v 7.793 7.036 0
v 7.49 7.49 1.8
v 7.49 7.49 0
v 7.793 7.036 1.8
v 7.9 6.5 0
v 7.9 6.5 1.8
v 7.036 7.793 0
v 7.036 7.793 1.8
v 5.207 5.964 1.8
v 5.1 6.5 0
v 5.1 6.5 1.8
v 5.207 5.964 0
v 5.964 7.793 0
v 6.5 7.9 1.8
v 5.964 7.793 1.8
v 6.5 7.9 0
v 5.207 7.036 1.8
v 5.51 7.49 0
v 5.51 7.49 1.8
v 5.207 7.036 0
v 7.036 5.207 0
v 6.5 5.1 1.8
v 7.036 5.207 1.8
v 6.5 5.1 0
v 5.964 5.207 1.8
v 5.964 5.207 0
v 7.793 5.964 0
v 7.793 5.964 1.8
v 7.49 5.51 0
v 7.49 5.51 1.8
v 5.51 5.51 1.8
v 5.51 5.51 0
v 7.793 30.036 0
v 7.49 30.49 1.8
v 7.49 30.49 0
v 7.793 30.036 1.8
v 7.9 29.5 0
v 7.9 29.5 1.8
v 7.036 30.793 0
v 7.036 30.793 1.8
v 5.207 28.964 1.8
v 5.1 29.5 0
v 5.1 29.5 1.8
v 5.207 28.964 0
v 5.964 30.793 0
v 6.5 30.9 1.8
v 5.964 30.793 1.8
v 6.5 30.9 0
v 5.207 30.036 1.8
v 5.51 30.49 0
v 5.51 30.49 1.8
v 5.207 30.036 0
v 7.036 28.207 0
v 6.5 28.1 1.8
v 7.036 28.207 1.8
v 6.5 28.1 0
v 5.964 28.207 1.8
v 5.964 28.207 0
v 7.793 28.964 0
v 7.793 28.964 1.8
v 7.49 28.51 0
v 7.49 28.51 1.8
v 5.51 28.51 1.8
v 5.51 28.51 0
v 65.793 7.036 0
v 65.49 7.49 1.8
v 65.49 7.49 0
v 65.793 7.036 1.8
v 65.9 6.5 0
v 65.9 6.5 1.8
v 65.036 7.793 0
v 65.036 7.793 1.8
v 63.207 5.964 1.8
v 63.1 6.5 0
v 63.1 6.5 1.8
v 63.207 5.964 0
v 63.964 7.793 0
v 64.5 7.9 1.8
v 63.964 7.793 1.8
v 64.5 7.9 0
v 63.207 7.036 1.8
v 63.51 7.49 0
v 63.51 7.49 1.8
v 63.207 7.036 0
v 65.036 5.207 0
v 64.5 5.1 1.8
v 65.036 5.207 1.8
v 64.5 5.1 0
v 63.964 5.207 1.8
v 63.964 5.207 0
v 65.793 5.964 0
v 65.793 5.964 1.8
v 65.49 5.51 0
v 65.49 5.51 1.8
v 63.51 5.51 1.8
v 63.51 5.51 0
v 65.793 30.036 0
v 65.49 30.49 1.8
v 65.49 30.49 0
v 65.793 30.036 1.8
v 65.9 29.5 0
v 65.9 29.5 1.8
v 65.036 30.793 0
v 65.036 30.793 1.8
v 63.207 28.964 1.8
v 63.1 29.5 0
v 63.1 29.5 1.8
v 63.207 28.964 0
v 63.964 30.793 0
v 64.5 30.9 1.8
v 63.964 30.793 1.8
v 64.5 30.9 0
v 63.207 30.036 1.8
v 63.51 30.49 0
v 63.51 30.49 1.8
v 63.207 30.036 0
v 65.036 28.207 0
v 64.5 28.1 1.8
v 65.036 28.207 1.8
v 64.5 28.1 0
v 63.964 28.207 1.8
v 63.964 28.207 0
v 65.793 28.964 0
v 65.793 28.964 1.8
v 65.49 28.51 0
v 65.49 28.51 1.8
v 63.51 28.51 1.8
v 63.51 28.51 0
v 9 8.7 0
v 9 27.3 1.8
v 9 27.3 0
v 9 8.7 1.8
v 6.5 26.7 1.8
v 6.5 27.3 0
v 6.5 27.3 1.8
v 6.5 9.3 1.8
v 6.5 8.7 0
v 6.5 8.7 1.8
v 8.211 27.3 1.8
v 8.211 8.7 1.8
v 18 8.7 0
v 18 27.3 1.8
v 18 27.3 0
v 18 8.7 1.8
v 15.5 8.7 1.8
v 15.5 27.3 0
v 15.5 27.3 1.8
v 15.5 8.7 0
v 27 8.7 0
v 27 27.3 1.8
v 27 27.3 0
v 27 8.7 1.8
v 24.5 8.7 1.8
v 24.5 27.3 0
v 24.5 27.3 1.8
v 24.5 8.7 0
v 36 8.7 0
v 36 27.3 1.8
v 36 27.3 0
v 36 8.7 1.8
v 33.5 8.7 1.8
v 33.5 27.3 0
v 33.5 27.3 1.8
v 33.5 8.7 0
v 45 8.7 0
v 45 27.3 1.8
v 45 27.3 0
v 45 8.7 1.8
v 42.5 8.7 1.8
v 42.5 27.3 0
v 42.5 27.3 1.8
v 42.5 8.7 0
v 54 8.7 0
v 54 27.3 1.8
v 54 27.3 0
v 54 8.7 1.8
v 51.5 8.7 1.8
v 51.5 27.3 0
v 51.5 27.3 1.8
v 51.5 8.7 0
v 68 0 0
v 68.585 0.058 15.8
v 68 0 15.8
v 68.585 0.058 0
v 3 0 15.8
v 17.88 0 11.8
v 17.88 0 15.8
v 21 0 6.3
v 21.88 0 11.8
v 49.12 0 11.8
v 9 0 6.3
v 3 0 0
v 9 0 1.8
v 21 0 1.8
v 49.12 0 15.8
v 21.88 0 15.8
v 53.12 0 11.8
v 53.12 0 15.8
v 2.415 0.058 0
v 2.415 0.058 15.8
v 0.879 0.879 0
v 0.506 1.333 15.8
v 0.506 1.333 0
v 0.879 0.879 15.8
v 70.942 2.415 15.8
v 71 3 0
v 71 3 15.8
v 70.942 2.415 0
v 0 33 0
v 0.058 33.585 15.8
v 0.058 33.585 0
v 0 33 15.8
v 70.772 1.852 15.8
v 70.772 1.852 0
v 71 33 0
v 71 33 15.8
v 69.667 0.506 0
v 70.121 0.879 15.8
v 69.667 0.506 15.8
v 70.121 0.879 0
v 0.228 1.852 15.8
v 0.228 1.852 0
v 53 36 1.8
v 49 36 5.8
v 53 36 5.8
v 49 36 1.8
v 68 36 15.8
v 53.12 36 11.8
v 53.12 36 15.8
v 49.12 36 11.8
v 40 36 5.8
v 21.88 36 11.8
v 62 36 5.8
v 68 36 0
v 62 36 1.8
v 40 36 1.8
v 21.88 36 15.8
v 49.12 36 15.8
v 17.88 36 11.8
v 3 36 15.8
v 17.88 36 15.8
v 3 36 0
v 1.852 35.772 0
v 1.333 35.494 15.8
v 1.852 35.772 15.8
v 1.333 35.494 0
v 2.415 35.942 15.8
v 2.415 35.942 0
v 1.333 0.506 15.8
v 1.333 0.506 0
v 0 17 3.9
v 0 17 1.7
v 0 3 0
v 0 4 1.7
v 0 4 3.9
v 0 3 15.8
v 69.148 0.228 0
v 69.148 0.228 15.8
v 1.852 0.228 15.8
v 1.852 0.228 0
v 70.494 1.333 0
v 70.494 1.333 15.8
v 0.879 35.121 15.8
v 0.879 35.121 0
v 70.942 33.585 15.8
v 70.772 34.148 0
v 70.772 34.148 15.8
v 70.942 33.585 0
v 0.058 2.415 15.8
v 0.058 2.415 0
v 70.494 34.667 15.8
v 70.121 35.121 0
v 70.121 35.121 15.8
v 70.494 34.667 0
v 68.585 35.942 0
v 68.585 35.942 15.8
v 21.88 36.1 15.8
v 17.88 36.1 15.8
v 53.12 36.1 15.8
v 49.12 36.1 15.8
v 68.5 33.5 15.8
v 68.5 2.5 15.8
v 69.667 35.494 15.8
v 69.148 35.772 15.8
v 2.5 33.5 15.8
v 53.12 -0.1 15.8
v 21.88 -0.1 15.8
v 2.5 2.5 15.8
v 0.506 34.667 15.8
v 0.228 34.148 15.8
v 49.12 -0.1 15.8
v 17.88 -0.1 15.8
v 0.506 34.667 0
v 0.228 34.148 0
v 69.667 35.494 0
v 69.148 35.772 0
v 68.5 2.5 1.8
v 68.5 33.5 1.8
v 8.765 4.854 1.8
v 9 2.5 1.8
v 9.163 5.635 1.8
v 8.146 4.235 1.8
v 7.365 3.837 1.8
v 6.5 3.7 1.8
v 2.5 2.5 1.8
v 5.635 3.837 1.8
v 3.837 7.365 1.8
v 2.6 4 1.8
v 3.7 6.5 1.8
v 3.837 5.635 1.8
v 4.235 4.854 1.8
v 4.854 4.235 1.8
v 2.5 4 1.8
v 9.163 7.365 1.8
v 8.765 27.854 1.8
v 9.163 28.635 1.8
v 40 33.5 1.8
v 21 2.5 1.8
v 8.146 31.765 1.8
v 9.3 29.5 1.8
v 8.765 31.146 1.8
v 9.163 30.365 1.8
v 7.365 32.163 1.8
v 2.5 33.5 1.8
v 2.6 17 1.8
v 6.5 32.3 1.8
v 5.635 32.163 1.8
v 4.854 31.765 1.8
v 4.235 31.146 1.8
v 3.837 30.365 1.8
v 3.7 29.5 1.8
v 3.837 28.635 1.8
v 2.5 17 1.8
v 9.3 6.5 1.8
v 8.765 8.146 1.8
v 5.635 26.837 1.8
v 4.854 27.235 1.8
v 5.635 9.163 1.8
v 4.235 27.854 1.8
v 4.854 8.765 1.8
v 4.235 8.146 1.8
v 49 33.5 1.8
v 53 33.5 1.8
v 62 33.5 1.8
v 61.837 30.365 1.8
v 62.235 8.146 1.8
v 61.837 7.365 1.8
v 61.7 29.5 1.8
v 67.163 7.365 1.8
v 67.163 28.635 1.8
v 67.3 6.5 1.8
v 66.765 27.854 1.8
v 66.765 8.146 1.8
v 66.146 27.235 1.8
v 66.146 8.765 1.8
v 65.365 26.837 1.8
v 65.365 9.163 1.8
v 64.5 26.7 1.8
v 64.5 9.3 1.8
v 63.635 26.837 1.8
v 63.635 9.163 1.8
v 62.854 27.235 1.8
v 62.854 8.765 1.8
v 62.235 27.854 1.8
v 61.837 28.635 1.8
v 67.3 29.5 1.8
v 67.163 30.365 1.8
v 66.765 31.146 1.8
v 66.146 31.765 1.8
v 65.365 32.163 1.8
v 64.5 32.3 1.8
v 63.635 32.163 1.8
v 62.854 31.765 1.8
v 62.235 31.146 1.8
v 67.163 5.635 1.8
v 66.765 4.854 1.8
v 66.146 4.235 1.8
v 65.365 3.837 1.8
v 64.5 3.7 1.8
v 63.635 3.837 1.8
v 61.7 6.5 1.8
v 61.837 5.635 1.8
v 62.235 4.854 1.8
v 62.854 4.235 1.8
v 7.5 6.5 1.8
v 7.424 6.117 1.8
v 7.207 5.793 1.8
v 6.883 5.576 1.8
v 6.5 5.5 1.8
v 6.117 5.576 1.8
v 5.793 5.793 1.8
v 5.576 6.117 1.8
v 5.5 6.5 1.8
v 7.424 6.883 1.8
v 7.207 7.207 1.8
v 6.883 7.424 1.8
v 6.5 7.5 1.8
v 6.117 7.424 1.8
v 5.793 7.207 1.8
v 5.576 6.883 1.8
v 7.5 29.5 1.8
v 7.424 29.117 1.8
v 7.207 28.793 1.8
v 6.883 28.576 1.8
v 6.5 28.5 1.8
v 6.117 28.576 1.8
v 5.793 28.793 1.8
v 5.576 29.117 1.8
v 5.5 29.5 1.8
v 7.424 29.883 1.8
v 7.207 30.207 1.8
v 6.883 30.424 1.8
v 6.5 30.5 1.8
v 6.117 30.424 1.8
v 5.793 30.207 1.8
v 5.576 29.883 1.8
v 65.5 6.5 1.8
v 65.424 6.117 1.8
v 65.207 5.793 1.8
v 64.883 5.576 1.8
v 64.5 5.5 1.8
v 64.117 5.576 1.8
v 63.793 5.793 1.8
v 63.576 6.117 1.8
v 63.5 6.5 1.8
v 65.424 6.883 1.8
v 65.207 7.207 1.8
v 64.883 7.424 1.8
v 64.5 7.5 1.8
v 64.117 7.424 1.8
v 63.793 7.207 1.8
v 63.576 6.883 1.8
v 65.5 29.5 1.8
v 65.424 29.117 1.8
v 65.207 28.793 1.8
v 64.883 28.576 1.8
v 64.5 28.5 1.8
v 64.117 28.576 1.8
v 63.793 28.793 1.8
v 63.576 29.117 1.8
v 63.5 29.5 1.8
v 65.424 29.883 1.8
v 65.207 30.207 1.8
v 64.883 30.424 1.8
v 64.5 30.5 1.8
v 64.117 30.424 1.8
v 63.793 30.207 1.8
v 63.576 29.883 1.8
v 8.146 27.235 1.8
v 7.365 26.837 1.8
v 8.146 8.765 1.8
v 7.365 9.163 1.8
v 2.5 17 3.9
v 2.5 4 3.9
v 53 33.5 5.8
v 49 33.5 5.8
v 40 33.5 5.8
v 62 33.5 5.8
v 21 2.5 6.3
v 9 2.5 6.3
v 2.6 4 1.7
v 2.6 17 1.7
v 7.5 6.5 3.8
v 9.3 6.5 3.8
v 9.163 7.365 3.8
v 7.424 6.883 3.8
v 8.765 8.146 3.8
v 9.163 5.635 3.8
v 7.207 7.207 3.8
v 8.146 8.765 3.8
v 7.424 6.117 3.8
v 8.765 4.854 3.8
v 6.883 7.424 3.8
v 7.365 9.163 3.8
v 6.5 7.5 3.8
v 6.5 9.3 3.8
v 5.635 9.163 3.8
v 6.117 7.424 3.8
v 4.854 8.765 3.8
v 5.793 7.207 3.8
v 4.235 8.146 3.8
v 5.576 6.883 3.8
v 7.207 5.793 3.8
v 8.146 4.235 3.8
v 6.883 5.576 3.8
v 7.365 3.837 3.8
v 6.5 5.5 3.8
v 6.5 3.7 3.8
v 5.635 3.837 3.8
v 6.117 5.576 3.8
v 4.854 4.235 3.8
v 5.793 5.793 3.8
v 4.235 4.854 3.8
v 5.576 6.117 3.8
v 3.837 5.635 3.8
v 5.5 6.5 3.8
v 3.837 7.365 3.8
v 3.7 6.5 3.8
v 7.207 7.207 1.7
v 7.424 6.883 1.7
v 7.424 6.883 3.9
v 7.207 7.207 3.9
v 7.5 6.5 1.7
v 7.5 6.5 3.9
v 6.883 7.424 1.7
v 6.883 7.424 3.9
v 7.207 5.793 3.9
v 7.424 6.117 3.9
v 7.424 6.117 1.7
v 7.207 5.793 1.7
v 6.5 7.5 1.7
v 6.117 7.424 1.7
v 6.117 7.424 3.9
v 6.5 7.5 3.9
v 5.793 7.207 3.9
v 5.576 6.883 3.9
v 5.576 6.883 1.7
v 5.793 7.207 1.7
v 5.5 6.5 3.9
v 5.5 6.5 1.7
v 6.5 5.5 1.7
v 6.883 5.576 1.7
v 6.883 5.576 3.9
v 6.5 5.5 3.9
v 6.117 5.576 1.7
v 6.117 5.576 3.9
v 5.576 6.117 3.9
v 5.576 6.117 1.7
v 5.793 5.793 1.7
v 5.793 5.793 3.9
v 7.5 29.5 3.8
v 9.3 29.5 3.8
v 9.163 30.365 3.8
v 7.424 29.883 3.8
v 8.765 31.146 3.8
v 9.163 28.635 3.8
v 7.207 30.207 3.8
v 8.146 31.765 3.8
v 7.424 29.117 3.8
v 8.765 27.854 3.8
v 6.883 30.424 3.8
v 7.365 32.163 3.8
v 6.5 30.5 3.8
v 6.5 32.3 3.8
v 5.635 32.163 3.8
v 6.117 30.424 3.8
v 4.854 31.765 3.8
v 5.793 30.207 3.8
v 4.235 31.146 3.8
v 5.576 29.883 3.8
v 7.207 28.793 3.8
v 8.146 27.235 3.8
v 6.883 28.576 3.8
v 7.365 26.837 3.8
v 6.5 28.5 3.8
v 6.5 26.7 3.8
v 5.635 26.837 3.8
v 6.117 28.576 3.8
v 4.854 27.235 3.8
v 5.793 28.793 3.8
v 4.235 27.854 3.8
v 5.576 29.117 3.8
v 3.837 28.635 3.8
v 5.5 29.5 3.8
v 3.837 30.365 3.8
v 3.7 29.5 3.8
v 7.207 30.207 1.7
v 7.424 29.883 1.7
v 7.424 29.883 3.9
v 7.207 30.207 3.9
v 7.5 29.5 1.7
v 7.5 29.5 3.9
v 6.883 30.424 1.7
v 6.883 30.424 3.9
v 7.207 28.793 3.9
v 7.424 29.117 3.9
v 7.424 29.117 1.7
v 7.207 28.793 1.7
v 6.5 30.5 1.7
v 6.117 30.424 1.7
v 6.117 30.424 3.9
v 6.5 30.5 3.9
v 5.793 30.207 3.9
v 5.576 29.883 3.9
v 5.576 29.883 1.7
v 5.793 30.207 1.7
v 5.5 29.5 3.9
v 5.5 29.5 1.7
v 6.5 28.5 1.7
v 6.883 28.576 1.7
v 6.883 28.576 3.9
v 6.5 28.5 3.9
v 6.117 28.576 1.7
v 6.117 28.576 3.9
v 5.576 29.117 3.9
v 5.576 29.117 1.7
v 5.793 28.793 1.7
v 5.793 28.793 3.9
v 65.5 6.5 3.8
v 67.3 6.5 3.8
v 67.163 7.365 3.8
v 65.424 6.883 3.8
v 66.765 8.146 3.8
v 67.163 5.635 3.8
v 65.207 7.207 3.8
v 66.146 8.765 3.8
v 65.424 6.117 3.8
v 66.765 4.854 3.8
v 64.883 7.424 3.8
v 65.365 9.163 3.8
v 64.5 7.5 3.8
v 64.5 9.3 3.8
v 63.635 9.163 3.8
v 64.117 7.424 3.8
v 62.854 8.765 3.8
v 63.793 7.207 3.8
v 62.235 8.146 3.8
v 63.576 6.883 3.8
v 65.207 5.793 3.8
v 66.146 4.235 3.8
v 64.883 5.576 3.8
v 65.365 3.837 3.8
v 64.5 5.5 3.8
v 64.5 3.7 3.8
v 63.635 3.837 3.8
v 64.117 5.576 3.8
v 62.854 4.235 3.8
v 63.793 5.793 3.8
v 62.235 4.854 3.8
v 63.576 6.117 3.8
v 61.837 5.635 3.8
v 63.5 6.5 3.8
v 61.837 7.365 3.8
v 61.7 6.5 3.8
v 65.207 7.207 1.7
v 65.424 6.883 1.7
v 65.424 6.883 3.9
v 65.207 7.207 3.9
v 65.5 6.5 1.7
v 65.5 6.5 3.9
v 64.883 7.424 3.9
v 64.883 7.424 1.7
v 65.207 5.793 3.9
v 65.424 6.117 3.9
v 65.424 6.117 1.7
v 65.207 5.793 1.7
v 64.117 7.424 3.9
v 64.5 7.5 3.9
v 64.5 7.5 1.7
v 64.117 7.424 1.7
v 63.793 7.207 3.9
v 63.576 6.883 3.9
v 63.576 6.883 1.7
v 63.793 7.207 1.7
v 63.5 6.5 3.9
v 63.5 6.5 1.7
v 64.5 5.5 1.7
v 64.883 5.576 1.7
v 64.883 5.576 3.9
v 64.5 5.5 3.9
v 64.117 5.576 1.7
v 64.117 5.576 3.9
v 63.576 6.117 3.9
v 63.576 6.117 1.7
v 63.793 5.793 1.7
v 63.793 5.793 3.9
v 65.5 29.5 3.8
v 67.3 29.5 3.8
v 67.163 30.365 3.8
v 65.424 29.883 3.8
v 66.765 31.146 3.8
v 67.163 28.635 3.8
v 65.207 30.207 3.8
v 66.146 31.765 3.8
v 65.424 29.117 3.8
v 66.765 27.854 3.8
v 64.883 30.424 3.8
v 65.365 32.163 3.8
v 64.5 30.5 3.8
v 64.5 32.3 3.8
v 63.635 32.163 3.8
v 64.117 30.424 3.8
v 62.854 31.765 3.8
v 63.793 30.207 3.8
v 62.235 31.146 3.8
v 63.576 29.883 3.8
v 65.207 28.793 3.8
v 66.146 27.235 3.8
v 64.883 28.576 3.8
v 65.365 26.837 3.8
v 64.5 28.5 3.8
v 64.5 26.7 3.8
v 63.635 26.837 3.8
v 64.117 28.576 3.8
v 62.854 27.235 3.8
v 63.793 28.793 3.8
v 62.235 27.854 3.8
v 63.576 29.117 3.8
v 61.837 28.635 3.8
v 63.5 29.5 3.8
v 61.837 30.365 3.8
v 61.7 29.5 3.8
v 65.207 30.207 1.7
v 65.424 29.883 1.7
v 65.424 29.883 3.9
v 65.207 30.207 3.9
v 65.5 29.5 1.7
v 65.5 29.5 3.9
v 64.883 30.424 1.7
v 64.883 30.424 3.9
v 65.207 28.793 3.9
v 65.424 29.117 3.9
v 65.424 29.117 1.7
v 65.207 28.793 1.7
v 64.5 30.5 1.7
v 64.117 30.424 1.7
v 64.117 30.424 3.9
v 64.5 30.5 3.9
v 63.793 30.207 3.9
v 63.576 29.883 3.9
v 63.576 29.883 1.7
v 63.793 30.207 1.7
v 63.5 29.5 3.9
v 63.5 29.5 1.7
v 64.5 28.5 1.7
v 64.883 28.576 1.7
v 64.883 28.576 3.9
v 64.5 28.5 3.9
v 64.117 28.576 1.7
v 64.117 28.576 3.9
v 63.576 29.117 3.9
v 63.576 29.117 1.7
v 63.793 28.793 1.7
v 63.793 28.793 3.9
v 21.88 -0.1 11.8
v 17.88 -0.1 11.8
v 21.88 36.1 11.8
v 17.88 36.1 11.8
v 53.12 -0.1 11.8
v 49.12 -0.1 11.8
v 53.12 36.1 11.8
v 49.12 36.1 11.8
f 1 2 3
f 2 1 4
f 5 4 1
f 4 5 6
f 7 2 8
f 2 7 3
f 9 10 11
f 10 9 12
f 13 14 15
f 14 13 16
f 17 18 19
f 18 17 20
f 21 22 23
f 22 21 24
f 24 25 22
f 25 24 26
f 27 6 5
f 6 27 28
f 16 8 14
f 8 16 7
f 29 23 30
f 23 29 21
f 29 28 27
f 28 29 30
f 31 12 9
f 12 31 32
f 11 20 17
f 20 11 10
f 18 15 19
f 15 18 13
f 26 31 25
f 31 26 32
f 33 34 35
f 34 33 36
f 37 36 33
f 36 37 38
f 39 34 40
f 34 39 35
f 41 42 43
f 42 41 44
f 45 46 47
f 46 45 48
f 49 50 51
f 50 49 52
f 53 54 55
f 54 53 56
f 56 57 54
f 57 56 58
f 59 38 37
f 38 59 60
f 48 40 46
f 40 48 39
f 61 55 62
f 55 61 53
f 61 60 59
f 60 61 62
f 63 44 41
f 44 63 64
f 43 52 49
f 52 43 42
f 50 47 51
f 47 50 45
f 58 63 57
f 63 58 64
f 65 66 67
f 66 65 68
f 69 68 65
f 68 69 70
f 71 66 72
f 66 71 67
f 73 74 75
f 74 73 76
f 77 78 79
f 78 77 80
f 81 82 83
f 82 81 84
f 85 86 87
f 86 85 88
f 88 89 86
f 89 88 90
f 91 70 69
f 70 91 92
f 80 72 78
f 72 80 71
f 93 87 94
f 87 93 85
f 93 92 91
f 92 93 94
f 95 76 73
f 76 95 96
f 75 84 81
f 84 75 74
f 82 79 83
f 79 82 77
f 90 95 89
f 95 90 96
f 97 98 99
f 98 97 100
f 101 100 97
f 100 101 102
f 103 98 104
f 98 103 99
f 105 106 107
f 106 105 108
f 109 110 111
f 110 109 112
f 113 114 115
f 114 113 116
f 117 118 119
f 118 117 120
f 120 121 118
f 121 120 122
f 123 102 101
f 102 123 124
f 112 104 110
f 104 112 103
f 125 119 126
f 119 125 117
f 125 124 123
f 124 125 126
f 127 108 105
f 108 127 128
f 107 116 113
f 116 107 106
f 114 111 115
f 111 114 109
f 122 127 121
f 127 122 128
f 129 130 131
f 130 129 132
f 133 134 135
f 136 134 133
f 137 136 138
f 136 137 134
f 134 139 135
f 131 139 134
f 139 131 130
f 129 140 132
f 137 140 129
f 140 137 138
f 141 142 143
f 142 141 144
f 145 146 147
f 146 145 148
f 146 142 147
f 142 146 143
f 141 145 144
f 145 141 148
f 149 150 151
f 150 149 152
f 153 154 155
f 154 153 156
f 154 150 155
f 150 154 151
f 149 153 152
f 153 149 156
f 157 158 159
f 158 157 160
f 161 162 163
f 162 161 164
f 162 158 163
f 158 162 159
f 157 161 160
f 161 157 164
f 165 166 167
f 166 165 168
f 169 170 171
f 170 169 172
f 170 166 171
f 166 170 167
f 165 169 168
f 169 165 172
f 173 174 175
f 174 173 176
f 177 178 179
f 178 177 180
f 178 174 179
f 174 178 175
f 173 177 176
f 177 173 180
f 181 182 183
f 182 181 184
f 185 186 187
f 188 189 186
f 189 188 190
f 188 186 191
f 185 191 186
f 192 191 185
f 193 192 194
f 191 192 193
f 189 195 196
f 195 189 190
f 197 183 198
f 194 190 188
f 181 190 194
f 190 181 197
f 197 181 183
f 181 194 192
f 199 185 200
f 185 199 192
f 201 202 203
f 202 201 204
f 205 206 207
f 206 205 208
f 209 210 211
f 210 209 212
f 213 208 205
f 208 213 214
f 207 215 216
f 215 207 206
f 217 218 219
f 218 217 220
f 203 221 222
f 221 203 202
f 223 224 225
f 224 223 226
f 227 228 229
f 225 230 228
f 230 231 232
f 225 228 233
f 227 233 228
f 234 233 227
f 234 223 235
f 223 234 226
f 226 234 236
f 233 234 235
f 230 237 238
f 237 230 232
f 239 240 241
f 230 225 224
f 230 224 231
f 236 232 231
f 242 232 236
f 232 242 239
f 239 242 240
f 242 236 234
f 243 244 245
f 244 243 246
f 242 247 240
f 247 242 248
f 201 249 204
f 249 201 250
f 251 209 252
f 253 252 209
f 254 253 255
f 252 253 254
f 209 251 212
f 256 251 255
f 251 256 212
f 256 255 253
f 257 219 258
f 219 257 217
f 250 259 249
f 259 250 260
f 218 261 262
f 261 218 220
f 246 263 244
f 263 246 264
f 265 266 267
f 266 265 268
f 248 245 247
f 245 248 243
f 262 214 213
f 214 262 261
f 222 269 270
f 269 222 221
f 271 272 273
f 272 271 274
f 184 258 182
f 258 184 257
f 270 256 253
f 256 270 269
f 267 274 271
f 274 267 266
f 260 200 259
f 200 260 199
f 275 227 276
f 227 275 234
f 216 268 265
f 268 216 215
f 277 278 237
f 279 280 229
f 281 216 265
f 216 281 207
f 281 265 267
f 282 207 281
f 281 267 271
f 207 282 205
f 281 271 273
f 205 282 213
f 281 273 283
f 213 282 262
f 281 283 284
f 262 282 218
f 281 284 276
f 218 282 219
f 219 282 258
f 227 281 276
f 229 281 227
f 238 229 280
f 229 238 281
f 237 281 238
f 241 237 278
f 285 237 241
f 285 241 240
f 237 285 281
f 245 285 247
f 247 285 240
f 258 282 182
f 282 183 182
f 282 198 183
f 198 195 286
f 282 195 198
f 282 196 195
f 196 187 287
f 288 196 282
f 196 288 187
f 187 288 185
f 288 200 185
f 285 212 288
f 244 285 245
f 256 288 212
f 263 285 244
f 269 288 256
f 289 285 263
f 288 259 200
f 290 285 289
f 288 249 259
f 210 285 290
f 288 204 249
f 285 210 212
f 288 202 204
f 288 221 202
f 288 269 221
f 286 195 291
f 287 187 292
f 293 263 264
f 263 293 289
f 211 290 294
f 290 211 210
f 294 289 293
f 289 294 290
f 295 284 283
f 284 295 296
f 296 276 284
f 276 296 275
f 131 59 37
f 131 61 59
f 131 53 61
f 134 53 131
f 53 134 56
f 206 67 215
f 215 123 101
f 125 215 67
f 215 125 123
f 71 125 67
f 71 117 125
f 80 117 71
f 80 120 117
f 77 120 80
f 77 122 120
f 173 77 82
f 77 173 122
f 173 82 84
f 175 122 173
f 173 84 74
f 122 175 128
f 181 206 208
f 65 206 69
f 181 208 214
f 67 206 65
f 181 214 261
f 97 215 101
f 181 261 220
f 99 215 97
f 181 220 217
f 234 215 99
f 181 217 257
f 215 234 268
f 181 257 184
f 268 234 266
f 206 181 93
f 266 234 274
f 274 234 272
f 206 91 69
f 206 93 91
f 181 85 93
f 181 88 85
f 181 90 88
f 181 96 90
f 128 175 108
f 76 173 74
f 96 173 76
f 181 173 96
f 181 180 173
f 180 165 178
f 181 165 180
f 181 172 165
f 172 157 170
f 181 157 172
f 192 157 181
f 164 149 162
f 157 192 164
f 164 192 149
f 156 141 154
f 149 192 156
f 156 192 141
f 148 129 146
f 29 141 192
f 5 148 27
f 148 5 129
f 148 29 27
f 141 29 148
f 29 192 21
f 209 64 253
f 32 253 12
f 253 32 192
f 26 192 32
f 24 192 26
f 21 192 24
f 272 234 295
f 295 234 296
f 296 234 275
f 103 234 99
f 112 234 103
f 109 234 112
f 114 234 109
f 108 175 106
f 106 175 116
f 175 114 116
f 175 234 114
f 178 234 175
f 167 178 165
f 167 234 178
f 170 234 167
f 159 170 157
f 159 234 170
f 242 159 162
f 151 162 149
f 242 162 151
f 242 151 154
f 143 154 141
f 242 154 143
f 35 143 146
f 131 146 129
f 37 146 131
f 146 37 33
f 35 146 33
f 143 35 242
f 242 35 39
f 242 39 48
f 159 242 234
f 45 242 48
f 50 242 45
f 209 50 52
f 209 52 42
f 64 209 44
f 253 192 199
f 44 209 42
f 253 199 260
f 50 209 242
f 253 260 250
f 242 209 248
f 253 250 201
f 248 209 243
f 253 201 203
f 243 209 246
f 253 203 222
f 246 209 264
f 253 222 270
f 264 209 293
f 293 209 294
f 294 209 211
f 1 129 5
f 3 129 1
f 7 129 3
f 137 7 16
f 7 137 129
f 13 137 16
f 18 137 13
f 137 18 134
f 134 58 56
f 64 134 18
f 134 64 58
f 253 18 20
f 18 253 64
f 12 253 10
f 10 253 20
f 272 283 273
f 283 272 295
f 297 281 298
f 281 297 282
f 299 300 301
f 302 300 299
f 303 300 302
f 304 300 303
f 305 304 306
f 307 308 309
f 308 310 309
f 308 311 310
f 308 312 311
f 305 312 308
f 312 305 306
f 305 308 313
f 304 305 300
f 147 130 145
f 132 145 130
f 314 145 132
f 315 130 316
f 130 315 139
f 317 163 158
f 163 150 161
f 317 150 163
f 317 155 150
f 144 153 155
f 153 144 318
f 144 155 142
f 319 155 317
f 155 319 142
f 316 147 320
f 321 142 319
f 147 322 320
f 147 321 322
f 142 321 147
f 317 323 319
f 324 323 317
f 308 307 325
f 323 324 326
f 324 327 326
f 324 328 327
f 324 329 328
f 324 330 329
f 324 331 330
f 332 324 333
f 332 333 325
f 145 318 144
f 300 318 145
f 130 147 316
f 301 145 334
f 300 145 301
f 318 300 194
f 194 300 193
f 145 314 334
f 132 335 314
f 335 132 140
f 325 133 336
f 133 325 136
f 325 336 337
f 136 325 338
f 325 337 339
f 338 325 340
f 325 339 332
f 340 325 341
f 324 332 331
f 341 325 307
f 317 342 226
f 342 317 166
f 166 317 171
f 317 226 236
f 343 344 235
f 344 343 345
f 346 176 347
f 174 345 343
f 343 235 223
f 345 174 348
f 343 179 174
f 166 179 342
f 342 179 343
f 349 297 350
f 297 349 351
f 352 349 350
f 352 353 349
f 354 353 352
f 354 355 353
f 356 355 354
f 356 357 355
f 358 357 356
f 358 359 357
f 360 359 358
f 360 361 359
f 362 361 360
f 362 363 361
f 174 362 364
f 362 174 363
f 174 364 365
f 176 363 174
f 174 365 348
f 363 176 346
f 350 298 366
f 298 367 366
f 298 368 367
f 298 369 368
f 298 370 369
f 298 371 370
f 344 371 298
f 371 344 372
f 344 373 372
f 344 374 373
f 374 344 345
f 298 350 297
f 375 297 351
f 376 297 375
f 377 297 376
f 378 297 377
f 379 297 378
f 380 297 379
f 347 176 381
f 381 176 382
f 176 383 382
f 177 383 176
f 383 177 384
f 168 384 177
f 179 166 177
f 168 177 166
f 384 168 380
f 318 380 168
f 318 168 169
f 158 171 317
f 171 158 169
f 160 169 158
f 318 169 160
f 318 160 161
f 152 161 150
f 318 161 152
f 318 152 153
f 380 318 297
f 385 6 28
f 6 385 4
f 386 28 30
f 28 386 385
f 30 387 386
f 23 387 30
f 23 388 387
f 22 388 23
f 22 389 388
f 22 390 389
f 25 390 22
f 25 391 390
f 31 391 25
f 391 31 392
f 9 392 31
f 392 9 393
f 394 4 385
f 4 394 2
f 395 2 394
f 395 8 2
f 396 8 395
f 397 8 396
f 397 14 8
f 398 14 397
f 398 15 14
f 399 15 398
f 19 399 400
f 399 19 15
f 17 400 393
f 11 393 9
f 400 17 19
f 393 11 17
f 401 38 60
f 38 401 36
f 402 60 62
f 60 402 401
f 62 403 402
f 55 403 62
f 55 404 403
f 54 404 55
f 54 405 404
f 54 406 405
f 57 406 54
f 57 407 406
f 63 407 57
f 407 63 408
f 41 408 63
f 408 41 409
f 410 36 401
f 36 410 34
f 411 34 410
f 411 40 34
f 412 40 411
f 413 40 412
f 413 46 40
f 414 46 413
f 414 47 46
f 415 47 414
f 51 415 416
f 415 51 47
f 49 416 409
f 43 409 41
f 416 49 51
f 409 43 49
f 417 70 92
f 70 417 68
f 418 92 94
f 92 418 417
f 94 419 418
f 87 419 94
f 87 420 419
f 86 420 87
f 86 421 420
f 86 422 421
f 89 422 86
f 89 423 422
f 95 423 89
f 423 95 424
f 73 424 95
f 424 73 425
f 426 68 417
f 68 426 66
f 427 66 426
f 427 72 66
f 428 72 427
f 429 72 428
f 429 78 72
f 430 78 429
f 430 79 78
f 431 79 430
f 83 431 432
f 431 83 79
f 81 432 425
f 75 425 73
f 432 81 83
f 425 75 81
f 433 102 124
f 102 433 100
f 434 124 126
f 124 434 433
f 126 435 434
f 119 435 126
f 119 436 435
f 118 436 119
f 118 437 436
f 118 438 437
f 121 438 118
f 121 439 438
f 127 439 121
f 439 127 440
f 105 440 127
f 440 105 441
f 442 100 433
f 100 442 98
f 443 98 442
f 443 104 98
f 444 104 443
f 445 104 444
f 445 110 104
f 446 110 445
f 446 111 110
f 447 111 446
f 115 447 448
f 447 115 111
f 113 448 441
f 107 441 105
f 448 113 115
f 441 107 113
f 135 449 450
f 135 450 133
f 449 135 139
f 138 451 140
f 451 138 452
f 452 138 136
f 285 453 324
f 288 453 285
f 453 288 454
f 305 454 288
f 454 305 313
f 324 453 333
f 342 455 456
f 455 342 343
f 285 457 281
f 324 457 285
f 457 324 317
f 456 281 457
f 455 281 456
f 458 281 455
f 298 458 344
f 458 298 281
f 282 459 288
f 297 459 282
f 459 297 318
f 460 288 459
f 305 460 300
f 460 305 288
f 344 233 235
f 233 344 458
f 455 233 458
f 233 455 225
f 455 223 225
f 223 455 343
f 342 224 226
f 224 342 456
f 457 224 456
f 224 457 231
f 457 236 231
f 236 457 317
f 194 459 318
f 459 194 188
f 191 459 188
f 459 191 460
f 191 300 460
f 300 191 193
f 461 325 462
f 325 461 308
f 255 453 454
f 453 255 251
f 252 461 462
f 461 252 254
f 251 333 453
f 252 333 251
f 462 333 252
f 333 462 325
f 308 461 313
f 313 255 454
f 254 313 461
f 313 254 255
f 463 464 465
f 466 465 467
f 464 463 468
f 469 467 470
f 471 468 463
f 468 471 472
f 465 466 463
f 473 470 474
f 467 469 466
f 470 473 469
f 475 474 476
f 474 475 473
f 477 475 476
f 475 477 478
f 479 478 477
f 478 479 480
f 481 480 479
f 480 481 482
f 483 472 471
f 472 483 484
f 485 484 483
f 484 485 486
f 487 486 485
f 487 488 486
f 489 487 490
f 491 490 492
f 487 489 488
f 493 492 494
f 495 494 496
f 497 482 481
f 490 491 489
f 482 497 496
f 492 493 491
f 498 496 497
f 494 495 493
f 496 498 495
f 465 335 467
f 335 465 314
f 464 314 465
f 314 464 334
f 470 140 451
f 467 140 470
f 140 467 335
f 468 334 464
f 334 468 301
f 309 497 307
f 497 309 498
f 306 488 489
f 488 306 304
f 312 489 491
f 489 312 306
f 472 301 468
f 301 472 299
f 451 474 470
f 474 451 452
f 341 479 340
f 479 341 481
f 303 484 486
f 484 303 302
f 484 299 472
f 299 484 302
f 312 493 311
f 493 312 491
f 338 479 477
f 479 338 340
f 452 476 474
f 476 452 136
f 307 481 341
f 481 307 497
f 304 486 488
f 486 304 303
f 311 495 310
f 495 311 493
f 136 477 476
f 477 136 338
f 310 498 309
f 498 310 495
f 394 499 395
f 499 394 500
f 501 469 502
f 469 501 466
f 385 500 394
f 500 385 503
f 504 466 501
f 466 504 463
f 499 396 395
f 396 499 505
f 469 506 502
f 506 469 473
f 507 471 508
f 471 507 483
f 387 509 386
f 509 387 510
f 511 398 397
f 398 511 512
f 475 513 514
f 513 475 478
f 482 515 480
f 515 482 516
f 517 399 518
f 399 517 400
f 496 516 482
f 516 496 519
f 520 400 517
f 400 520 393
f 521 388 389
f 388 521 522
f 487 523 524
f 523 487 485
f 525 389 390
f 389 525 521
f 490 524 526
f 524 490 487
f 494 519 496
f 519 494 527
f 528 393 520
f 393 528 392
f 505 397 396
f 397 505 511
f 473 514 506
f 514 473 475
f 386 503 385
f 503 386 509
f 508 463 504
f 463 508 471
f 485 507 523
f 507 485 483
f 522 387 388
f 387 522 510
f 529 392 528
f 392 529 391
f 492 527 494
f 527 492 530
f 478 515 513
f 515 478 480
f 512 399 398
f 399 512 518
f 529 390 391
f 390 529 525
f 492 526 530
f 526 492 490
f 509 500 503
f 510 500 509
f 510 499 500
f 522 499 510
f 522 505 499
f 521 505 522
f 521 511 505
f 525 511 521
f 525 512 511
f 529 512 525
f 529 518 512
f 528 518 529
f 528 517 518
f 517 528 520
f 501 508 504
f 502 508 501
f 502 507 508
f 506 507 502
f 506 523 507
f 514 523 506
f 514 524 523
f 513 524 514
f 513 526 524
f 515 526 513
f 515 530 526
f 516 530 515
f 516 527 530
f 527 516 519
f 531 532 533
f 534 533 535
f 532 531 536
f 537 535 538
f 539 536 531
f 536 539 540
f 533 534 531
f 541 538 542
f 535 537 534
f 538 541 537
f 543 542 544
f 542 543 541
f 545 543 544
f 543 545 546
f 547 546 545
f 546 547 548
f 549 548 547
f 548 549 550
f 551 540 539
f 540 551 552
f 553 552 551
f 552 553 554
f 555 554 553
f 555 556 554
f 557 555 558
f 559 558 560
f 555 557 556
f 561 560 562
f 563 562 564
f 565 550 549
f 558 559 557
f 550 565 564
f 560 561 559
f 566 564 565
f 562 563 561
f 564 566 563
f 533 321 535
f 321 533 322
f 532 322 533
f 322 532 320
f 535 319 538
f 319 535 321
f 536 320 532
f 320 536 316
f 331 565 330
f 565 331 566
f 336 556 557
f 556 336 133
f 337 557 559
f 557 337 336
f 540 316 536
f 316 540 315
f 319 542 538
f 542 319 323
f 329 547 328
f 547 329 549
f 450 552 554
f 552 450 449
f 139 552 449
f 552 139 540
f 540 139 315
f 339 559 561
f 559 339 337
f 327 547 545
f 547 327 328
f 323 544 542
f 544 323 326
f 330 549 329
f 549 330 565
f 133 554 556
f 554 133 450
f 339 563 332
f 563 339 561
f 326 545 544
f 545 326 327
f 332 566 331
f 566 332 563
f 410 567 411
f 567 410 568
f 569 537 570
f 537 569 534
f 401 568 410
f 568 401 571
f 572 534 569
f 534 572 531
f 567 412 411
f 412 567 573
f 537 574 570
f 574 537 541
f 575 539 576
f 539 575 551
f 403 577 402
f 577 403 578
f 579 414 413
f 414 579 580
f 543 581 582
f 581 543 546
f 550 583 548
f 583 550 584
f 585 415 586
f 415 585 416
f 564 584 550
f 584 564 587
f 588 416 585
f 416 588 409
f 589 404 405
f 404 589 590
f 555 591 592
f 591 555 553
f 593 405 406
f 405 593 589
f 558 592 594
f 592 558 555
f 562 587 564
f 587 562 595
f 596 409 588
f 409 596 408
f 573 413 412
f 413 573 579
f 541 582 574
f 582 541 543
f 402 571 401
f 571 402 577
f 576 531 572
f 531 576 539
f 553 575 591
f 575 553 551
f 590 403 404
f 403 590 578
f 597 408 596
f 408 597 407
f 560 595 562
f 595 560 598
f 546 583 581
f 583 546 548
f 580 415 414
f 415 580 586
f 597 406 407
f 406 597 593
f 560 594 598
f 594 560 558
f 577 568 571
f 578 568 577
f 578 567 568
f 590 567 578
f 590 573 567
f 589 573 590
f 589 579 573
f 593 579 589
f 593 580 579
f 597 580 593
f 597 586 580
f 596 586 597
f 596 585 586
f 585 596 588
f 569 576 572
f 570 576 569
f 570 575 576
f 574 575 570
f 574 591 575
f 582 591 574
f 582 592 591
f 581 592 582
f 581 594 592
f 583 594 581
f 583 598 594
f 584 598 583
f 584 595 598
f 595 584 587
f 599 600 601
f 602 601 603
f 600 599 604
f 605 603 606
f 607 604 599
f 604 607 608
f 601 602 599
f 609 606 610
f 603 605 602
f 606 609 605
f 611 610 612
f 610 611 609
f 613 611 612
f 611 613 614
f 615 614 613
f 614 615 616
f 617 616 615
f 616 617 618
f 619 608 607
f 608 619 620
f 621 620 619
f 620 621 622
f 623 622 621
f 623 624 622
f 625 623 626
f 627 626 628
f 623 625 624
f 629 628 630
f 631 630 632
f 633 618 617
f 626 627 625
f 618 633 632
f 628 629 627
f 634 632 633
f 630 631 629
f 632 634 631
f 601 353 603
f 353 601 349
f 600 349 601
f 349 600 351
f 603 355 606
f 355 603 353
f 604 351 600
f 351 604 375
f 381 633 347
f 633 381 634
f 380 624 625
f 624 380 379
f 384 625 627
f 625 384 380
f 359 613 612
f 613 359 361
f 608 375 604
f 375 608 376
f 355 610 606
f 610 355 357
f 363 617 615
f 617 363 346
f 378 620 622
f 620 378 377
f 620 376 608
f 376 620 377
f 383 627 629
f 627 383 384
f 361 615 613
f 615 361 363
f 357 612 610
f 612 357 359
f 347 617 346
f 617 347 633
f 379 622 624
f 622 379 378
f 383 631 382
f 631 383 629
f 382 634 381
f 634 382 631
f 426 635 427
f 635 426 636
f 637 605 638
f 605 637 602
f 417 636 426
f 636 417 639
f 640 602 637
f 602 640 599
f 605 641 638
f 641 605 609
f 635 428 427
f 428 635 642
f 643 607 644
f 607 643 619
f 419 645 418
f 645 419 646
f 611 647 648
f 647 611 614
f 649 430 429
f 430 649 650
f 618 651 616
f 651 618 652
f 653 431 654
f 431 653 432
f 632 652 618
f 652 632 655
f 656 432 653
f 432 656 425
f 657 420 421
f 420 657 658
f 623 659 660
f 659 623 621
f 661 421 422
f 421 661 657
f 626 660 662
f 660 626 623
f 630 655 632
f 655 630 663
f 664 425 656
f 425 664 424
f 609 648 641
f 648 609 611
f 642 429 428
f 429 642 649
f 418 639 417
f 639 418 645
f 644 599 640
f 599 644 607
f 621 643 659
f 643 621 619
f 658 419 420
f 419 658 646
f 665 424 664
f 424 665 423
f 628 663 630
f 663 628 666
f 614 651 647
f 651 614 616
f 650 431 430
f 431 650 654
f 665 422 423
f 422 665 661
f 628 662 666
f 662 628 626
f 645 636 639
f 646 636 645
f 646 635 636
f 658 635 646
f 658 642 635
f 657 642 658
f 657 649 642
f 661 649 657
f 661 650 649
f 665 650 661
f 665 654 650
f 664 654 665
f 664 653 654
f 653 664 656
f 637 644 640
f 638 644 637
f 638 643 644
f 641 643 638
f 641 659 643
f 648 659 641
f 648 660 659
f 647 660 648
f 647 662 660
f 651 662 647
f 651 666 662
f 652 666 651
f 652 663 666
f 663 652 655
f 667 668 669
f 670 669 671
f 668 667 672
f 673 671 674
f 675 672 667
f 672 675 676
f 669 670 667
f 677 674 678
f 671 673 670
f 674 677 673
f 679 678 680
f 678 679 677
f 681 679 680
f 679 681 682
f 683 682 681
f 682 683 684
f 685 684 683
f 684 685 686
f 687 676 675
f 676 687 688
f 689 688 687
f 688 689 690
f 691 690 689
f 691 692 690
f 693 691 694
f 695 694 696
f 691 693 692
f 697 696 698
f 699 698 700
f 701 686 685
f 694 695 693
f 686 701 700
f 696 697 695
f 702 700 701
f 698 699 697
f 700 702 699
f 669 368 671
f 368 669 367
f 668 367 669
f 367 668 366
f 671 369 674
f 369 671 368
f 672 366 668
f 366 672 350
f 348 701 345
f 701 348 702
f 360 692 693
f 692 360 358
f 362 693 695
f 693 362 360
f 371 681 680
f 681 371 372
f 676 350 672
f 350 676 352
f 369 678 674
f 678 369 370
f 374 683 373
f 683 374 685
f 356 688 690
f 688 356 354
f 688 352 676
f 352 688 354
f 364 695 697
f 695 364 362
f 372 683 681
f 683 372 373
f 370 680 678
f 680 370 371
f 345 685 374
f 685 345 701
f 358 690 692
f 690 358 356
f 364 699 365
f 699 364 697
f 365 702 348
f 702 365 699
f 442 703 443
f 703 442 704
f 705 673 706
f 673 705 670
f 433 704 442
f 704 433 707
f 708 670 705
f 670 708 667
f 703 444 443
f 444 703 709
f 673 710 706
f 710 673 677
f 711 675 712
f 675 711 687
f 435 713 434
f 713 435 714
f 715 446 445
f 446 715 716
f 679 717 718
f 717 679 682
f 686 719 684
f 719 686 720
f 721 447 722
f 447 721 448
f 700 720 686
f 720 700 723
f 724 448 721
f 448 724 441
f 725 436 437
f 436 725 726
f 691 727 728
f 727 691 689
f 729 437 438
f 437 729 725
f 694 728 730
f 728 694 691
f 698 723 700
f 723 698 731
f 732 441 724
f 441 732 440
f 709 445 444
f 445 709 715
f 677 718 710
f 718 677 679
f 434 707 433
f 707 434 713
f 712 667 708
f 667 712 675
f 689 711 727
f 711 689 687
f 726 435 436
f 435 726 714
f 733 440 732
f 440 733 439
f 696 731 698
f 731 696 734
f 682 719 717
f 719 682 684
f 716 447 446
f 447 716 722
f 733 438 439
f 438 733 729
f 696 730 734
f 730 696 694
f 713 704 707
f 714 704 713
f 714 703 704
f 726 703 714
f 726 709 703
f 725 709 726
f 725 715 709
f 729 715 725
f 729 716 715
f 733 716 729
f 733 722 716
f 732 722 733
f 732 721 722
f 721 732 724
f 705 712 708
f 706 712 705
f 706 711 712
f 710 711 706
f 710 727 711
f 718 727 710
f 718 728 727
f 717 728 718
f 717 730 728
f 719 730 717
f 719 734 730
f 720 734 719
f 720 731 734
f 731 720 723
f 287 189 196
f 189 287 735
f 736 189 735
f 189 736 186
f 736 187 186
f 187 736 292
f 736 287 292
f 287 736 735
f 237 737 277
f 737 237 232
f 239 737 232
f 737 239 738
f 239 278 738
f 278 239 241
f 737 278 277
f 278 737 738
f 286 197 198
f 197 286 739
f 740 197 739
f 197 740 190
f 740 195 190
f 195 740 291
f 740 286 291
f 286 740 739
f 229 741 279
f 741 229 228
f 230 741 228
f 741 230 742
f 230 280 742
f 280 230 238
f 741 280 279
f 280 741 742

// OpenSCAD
// ╔══════════════════════════════════════════════════════════╗
// ║  Pi Zero 2 WH Gehäuse – UNTERTEIL                       ║
// ║  Tobias Meier · admin@secutobs.com · v0.2.0             ║
// ╠══════════════════════════════════════════════════════════╣
// ║  DRUCKEN:                                               ║
// ║  1. F6 → rendern  2. File → Export → STL               ║
// ║  Material:  PLA  |  Schichthöhe: 0.2mm                 ║
// ║  Wandlinien: 4   |  Infill: 20%  |  Support: NEIN      ║
// ╚══════════════════════════════════════════════════════════╝

// ── Platinen-Maße Pi Zero 2W ─────────────────────────────
PI_L   = 65.0;   // Platinenlänge
PI_B   = 30.0;   // Platinenbreite
SPIEL  =  0.5;   // Spiel ringsrum

// ── Gehäuse-Parameter ───────────────────────────────────
WAND   =  2.5;   // Wandstärke
BODEN  =  1.8;   // Bodenstärke
H_INNEN = 14.0;  // Innenhöhe (Platine ~5mm + Bauteile + Luft)
R_ECKE =  3.0;   // Eckenradius

// ── Berechnete Maße ──────────────────────────────────────
IN_L = PI_L + SPIEL*2;    // Innenmaß Länge
IN_B = PI_B + SPIEL*2;    // Innenmaß Breite
AU_L = IN_L + WAND*2;     // Außenmaß Länge  = ~73mm
AU_B = IN_B + WAND*2;     // Außenmaß Breite = ~37mm
AU_H = H_INNEN + BODEN;   // Außenhöhe gesamt

// ── Pi Zero Lochpositionen (von Platinen-Ursprung) ───────
// Löcher: 3.5mm Ø, Raster 58 x 23mm (Mitte-zu-Mitte)
L_X1 = WAND + SPIEL + 3.5;
L_X2 = WAND + SPIEL + 3.5 + 58.0;
L_Y1 = WAND + SPIEL + 3.5;
L_Y2 = WAND + SPIEL + 3.5 + 23.0;

// ── Port-Positionen (von Platinen-Kante gemessen) ────────
// Rechte Seite: PWR (Micro-USB) und OTG (Micro-USB)
// Pi Zero: PWR bei X≈54mm, OTG bei X≈41mm (von links)
PWR_X  = WAND + SPIEL + 54.5;   // Mitte PWR-USB
OTG_X  = WAND + SPIEL + 41.5;   // Mitte OTG-USB
USB_B  =  9.0;   // Breite Micro-USB Ausschnitt
USB_H  =  4.0;   // Höhe  Micro-USB Ausschnitt
USB_Z  =  BODEN; // USB liegt direkt auf Boden-Level

// Linke Seite: Mini-HDMI bei X≈12mm
HDMI_X = WAND + SPIEL + 12.0;
HDMI_B = 12.0;
HDMI_H =  4.5;

// Vorne (kurze Seite, wo SD-Karte): SD bei Y≈1mm
SD_X   = WAND + SPIEL + 1.0;
SD_B   = 13.0;
SD_H   =  2.2;

// ── Lüftungsschlitze Boden ───────────────────────────────
// Schmal und kurz → kein Durchhängen
SLOT_B = 2.5;    // Breite Schlitz (schmal!)
SLOT_H = IN_B * 0.6;  // Länge
SLOT_Z = BODEN;

$fn = 40;

// ════════════════════════════════════════════════════════
//  UNTERTEIL
// ════════════════════════════════════════════════════════
module gehaeuse_unterteil() {
    difference() {
        // ── Grundkörper mit abgerundeten Ecken ──────────
        hull() {
            for(x = [R_ECKE, AU_L - R_ECKE])
            for(y = [R_ECKE, AU_B - R_ECKE])
                translate([x, y, 0])
                    cylinder(r=R_ECKE, h=AU_H, $fn=32);
        }

        // ── Innenraum ───────────────────────────────────
        translate([WAND, WAND, BODEN])
            cube([IN_L, IN_B, H_INNEN + 0.1]);

        // ── Port-Ausschnitte ────────────────────────────

        // PWR Micro-USB (rechte kurze Seite)
        translate([PWR_X - USB_B/2, AU_B - WAND - 0.1, USB_Z])
            cube([USB_B, WAND + 0.2, USB_H]);

        // OTG Micro-USB (rechte kurze Seite)
        translate([OTG_X - USB_B/2, AU_B - WAND - 0.1, USB_Z])
            cube([USB_B, WAND + 0.2, USB_H]);

        // Mini-HDMI (linke kurze Seite)
        translate([HDMI_X - HDMI_B/2, -0.1, USB_Z])
            cube([HDMI_B, WAND + 0.2, HDMI_H]);

        // SD-Karte (lange Seite vorne, links)
        translate([-0.1, SD_X, BODEN - 0.1])
            cube([WAND + 0.2, SD_B, SD_H]);

        // ── Schraublöcher in Ecken (M2.5) ───────────────
        // Option: Gehäuse kann mit Schrauben geschlossen werden
        for(x = [L_X1, L_X2])
        for(y = [L_Y1, L_Y2])
            translate([x, y, -0.1])
                cylinder(r=1.4, h=BODEN + 0.2, $fn=16);

        // ── Lüftungsschlitze Boden (schmal, kein Support) ─
        for(i = [0:5])
            translate([WAND + 4 + i * 9, (AU_B - SLOT_H)/2, -0.1])
                cube([SLOT_B, SLOT_H, BODEN + 0.2]);
    }

    // ── Montagepfosten innen ─────────────────────────────
    // Platine liegt auf diesen Pfosten auf (Höhe = 2mm)
    for(x = [L_X1, L_X2])
    for(y = [L_Y1, L_Y2]) {
        translate([x, y, BODEN])
            cylinder(r=2.8, h=2.0, $fn=20);
        // Sackloch für M2 Schraube (optional)
        translate([x, y, BODEN - 0.1])
            cylinder(r=1.0, h=2.2, $fn=16);
    }

    // ── Clip-Nasen für Deckel (je 2× links/rechts) ───────
    for(x = [AU_L*0.28, AU_L*0.72]) {
        translate([x - 2, -0.1, AU_H - 4])
            cube([4, 1.6, 4]);
        translate([x - 2, AU_B - 1.5, AU_H - 4])
            cube([4, 1.6, 4]);
    }
}

gehaeuse_unterteil();

// ════════════════════════════════════════════════════════
//  PORT-REFERENZ
// ════════════════════════════════════════════════════════
// Ausrichtung auf dem Druckbett: Boden nach unten
// Die Öffnungen sind:
//   Kurze Seite hinten (Y=AU_B): PWR + OTG Micro-USB
//   Kurze Seite vorne (Y=0):     Mini-HDMI
//   Lange Seite links (X=0):     SD-Karten-Schlitz
